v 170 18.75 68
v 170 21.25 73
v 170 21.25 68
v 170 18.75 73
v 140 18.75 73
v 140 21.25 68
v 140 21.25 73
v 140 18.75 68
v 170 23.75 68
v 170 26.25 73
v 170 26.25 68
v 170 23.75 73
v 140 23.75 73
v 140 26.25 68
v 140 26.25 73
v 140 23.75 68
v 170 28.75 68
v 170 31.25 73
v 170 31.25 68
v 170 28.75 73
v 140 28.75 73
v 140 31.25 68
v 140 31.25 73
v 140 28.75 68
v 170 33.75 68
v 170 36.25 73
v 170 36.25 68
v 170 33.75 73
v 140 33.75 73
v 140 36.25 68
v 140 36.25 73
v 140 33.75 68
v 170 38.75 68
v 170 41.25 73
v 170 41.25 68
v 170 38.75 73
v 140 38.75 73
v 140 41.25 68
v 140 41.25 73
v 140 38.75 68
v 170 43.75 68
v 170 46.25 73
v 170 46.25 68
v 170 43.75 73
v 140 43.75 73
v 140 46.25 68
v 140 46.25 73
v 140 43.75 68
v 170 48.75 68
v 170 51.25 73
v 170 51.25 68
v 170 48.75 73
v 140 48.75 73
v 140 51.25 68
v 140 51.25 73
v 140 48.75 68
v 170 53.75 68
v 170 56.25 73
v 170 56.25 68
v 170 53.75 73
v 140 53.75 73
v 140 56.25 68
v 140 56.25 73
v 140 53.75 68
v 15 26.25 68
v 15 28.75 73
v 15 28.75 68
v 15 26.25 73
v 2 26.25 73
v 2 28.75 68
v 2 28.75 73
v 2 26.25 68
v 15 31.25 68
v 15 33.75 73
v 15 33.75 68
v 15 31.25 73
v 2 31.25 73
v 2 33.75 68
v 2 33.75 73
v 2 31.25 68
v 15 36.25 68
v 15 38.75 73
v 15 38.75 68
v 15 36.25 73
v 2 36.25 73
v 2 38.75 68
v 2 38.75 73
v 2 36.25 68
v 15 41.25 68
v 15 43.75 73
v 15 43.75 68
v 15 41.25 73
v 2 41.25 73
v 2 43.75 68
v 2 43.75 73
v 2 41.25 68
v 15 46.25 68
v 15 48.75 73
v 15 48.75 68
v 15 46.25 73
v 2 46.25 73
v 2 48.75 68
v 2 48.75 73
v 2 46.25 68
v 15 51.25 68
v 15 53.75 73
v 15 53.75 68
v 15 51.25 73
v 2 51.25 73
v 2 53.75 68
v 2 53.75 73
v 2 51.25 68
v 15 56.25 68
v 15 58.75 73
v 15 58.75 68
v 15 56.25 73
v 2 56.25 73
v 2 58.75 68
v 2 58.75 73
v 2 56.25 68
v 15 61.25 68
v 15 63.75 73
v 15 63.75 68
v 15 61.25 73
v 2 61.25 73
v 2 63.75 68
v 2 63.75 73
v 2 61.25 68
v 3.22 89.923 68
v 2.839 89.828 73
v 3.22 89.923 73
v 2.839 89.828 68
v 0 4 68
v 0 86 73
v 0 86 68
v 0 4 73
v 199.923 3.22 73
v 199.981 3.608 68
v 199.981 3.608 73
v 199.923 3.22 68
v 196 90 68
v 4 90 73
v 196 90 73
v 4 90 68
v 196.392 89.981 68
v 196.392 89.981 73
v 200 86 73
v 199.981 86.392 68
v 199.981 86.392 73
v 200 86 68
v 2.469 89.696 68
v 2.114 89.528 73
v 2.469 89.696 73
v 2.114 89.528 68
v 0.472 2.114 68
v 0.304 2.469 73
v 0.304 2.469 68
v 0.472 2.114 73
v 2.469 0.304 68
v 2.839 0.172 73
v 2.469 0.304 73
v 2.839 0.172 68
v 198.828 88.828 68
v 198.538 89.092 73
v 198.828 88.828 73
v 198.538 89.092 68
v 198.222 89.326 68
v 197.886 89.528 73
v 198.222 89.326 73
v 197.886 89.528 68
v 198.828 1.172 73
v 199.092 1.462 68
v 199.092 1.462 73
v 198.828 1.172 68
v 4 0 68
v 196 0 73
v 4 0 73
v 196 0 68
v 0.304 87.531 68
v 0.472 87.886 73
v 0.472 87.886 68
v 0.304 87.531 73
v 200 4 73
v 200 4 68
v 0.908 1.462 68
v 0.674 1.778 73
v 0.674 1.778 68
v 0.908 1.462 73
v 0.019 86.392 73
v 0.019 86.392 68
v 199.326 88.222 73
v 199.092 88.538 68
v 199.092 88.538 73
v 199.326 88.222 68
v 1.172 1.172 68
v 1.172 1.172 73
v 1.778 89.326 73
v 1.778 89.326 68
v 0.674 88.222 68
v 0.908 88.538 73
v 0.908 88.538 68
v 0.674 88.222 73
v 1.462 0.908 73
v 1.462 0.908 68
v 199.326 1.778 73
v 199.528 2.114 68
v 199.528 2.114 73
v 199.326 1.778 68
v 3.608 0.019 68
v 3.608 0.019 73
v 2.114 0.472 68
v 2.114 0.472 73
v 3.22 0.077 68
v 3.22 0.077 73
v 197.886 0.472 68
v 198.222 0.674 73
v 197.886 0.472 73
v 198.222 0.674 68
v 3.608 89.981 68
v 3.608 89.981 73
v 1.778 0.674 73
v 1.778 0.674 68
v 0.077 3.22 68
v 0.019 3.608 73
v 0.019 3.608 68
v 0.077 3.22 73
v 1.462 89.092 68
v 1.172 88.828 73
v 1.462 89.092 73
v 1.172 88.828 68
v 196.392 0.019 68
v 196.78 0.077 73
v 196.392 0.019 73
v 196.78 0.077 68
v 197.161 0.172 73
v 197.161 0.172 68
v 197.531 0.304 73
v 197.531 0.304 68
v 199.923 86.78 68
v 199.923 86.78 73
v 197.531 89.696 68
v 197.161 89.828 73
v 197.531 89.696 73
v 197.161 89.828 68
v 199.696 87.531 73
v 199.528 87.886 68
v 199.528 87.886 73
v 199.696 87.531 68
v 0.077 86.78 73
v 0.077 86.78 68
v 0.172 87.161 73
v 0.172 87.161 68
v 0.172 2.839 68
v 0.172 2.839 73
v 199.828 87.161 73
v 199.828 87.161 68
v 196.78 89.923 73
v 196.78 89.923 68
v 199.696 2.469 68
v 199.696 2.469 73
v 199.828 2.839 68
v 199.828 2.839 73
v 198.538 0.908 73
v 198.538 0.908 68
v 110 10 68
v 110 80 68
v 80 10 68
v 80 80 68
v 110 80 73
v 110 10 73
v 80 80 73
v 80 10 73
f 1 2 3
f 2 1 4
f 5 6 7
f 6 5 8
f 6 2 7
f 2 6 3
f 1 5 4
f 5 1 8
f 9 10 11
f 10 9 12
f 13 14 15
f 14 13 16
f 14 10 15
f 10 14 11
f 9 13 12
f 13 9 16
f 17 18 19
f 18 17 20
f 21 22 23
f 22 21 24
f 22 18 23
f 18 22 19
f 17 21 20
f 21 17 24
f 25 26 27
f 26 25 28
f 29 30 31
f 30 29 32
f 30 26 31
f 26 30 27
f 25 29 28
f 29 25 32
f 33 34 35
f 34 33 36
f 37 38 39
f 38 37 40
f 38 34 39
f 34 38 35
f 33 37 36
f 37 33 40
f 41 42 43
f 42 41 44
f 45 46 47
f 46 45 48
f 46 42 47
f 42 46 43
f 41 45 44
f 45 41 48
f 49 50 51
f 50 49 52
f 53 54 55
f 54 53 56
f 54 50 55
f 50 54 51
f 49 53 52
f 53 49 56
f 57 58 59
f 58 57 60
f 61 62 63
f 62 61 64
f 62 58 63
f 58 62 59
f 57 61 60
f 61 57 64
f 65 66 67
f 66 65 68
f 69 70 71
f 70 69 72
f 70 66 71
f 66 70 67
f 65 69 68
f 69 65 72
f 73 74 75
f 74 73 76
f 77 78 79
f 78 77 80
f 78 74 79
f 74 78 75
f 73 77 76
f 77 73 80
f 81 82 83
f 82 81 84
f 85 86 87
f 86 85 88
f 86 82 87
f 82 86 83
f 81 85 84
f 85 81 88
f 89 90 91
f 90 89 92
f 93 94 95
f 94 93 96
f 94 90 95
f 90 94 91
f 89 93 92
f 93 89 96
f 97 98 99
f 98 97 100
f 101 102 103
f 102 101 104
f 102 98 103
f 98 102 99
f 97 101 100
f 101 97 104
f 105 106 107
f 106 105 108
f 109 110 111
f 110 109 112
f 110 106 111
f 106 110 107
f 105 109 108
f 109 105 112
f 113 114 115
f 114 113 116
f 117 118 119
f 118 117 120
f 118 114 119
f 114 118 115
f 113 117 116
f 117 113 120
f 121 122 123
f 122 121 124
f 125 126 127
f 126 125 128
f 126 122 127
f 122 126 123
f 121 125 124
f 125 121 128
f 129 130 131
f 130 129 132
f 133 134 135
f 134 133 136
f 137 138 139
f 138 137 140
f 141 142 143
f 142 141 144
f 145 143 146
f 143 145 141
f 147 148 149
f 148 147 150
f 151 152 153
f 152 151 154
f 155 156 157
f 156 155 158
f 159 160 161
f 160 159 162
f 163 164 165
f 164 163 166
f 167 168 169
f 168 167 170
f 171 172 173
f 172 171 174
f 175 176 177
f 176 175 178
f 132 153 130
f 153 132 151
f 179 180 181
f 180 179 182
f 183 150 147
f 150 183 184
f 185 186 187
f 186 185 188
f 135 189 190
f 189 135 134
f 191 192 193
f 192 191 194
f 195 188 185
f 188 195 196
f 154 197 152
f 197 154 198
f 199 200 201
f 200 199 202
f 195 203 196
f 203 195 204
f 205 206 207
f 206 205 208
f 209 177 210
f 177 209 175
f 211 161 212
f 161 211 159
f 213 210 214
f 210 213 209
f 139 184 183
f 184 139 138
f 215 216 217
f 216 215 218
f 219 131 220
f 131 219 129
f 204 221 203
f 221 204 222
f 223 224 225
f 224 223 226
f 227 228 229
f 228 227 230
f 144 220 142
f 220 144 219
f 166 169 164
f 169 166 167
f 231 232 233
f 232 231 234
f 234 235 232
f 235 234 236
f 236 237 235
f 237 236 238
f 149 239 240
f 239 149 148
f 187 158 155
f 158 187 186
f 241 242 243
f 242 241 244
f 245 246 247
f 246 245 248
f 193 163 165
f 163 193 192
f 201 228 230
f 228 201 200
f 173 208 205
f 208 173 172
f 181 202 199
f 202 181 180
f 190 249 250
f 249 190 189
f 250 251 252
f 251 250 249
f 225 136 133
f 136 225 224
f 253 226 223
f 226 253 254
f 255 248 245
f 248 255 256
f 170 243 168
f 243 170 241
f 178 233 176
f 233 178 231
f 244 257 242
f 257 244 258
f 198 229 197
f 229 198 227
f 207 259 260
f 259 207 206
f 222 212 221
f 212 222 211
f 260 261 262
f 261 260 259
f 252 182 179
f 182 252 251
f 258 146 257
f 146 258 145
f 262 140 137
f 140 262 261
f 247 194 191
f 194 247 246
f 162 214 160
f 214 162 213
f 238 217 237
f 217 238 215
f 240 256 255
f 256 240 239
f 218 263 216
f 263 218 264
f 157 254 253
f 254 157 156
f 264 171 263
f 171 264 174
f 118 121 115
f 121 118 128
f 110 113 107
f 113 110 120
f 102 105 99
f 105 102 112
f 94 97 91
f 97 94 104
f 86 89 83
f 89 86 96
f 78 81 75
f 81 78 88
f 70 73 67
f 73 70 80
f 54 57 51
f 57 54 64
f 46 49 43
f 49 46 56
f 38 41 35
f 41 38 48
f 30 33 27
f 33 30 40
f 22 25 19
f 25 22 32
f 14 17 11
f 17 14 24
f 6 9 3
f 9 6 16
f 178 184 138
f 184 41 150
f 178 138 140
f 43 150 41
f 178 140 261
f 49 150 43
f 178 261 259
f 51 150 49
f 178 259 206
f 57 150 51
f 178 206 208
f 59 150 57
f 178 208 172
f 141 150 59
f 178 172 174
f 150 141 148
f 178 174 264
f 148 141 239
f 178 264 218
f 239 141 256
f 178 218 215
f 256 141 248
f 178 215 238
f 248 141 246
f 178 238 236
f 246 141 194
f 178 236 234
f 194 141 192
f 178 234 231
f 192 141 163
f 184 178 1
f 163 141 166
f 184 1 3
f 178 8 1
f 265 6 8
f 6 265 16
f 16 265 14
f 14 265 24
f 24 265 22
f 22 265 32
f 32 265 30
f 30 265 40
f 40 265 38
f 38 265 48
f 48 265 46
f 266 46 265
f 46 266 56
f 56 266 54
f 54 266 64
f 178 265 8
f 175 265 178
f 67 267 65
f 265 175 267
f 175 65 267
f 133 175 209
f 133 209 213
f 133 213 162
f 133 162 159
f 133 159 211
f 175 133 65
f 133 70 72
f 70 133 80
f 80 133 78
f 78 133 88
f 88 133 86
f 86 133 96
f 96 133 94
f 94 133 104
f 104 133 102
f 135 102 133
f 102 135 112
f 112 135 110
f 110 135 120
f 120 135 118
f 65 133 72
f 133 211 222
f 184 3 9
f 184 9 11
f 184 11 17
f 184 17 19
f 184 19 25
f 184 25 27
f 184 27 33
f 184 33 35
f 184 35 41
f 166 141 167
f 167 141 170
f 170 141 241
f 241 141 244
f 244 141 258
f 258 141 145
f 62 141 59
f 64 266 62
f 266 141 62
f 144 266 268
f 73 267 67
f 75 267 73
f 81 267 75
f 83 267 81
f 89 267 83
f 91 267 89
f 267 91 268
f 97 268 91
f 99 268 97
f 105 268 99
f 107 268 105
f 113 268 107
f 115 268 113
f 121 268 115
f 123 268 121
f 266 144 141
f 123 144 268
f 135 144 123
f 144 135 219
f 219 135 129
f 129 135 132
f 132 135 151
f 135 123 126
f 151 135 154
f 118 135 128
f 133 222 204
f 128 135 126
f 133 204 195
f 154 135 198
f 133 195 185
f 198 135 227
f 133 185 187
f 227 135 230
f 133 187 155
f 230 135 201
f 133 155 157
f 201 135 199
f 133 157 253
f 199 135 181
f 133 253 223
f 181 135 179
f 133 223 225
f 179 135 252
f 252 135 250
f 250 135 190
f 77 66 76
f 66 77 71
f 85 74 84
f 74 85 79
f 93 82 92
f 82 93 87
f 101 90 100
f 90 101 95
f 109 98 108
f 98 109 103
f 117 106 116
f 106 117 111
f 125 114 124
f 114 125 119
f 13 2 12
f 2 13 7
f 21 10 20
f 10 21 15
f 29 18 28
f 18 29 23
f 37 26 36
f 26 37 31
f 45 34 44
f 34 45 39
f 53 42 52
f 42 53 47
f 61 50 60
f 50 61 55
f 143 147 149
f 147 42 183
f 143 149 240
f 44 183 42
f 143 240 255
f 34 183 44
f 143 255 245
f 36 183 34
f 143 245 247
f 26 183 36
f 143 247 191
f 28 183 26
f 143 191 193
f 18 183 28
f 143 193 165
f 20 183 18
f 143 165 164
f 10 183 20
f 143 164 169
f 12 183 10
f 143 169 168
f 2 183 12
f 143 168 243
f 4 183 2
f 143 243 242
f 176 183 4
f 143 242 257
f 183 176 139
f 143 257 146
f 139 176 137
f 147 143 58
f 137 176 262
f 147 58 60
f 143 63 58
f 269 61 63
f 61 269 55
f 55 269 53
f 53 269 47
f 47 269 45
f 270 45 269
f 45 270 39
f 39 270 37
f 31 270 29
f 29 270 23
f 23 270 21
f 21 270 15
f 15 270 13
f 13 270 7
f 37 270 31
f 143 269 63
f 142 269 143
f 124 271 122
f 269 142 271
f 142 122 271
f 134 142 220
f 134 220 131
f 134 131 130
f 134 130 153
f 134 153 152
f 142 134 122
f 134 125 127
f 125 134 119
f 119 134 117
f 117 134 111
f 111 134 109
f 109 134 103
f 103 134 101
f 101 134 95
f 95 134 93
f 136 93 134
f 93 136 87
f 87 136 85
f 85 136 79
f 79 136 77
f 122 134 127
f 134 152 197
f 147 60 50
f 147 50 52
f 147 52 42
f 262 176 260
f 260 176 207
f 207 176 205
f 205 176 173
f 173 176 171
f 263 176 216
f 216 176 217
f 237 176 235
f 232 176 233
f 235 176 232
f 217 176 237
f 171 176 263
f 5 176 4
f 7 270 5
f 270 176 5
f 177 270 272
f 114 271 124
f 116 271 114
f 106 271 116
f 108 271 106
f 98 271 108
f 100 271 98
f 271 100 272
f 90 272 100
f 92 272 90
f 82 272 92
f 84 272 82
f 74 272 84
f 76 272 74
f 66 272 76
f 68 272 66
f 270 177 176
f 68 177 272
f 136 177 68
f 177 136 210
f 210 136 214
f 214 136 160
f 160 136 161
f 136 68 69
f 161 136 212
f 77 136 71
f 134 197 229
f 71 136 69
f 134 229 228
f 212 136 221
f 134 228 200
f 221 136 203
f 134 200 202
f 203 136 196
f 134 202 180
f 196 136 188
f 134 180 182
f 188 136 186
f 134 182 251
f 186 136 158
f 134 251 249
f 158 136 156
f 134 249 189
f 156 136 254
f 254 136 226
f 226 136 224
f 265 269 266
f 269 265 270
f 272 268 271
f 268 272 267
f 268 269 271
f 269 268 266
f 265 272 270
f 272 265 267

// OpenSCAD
// ===================================================
// TWO-PART BOX: base shell + top plate (lid)
// Inside: 190 × 80 × 40 mm
// Wall thickness: 5 mm
// Top plate thickness: 5 mm
// Rounded outer edges only (vertical edges)
// Source ChatGPT 30.10.2025
// ===================================================

// ---------- Parameters ----------
innerLen = 190;
innerWid = 80;
innerH   = 40;
wall     = 5;
bottomT  = 5;
lidT     = 5;
footH    = 3;
footDia  = 8;
edgeR    = 4;   // 🔸 corner radius (outer edges only)

// ---------- Cable Cutout ----------
cutout_x_start = 115;
cutout_x_end   = 185;
cutout_height  = 15;
cutout_offsetZ = 25;
cutout_wall    = "back";

// ---------- Ventilation Rectangles ----------
vent_x_start = 110;
vent_x_end   = 180;
vent_y_start = 25;
vent_y_end   = 50;
vent_count   = 5;
vent_height  = 2.5;
vent_spacing = 2.5;

// ---------- Top Plate Ventilation ----------
top_vent_x_start = 120;
top_vent_x_end   = 170;
top_vent_y_start = 25;
top_vent_y_end   = 50;
top_vent_count   = 8;
top_vent_height  = 2.5;
top_vent_spacing = 2.5;

// ---------- Speaker Cutouts ----------
speaker_x_start = 2;
speaker_x_end   = 15;
speaker_y_start = 0;
speaker_y_end   = 80;
speaker_count   = 8;
speaker_height  = 2.5;
speaker_spacing = 2.5;

// ---------- Center Cutout ----------
center_cutout_len = 30;
center_cutout_wid = 70;
center_cutout_offsetX = 95;
center_cutout_offsetY = 45;

// ---------- Derived ----------
outerLen = innerLen + 2*wall;
outerWid = innerWid + 2*wall;
outerH   = bottomT + innerH;
eps = 0.5;

// ===================================================
// MAIN SWITCHES
// ===================================================
show_base = false;
show_lid  = true;

// ===================================================
// MODULE: ROUNDED OUTER SHELL (4 corners only)
// ===================================================
module roundedOuterBox(len, wid, h, r) {
    hull() {
        translate([r, r, 0])             cylinder(h=h, r=r, $fn=64);
        translate([len - r, r, 0])       cylinder(h=h, r=r, $fn=64);
        translate([r, wid - r, 0])       cylinder(h=h, r=r, $fn=64);
        translate([len - r, wid - r, 0]) cylinder(h=h, r=r, $fn=64);
    }
}

// ===================================================
// MODULE: BASE BOX (lifted by foot height)
// ===================================================
module baseBox() {
    translate([0, 0, footH])
    difference() {
        // Outer rounded shell (4 main vertical edges)
        roundedOuterBox(outerLen, outerWid, outerH, edgeR);

        // Inner cavity (regular rectangular cut)
        translate([wall, wall, bottomT])
            cube([innerLen, innerWid, innerH + eps]);

        // Cable cutout
        if (cutout_wall == "front") {
            translate([cutout_x_start, -eps, outerH - cutout_offsetZ - cutout_height])
                cube([cutout_x_end - cutout_x_start, wall + 2*eps, cutout_height]);
        } else if (cutout_wall == "back") {
            translate([cutout_x_start, outerWid - wall - eps, outerH - cutout_offsetZ - cutout_height])
                cube([cutout_x_end - cutout_x_start, wall + 2*eps, cutout_height]);
        }

        // Bottom ventilation slots
        vent_area_height = vent_y_end - vent_y_start;
        total_slot_height = vent_count * vent_height + (vent_count - 1) * vent_spacing;
        vent_y_offset = vent_y_start + (vent_area_height - total_slot_height) / 2;

        for (i = [0 : vent_count - 1]) {
            slot_y = vent_y_offset + i * (vent_height + vent_spacing);
            translate([vent_x_start, slot_y, -eps])
                cube([vent_x_end - vent_x_start, vent_height, bottomT + 2*eps]);
        }
    }

    // Feet
    foot(5, 5);
    foot(outerLen - 5, 5);
    foot(5, outerWid - 5);
    foot(outerLen - 5, outerWid - 5);
}

// ===================================================
// MODULE: FOOT
// ===================================================
module foot(x, y) {
    translate([x, y, 0])
        cylinder(h = footH, d = footDia, $fn = 48);
}

// ===================================================
// MODULE: TOP PLATE (lid)
// ===================================================
module topPlate() {
    translate([0, 0, outerH + footH + 20]) {
        difference() {
            // Rounded top plate (outer corners only)
            roundedOuterBox(outerLen, outerWid, lidT, edgeR);

            // Top ventilation slots
            vent_area_height = top_vent_y_end - top_vent_y_start;
            total_slot_height = top_vent_count * top_vent_height + (top_vent_count - 1) * top_vent_spacing;
            vent_y_offset = top_vent_y_start + (vent_area_height - total_slot_height) / 2;

            for (i = [0 : top_vent_count - 1]) {
                slot_y = vent_y_offset + i * (top_vent_height + top_vent_spacing);
                translate([top_vent_x_start + 20, slot_y, -eps])
                    cube([top_vent_x_end - top_vent_x_start - 20, top_vent_height, lidT + 2*eps]);
            }

            // Speaker slots
            total_slot_height = speaker_count * speaker_height + (speaker_count - 1) * speaker_spacing;
            speaker_y_offset = (outerWid - total_slot_height) / 2;

            for (i = [0 : speaker_count - 1]) {
                slot_y = speaker_y_offset + i * (speaker_height + speaker_spacing);
                translate([speaker_x_start, slot_y, -eps])
                    cube([speaker_x_end - speaker_x_start, speaker_height, lidT + 2*eps]);
            }

            // Center cutout
            translate([center_cutout_offsetX - center_cutout_len/2,
                       center_cutout_offsetY - center_cutout_wid/2,
                       -eps])
                cube([center_cutout_len, center_cutout_wid, lidT + 2*eps]);
        }
    }
}

// ===================================================
// OUTPUT
// ===================================================
if (show_base) baseBox();
if (show_lid) topPlate();
